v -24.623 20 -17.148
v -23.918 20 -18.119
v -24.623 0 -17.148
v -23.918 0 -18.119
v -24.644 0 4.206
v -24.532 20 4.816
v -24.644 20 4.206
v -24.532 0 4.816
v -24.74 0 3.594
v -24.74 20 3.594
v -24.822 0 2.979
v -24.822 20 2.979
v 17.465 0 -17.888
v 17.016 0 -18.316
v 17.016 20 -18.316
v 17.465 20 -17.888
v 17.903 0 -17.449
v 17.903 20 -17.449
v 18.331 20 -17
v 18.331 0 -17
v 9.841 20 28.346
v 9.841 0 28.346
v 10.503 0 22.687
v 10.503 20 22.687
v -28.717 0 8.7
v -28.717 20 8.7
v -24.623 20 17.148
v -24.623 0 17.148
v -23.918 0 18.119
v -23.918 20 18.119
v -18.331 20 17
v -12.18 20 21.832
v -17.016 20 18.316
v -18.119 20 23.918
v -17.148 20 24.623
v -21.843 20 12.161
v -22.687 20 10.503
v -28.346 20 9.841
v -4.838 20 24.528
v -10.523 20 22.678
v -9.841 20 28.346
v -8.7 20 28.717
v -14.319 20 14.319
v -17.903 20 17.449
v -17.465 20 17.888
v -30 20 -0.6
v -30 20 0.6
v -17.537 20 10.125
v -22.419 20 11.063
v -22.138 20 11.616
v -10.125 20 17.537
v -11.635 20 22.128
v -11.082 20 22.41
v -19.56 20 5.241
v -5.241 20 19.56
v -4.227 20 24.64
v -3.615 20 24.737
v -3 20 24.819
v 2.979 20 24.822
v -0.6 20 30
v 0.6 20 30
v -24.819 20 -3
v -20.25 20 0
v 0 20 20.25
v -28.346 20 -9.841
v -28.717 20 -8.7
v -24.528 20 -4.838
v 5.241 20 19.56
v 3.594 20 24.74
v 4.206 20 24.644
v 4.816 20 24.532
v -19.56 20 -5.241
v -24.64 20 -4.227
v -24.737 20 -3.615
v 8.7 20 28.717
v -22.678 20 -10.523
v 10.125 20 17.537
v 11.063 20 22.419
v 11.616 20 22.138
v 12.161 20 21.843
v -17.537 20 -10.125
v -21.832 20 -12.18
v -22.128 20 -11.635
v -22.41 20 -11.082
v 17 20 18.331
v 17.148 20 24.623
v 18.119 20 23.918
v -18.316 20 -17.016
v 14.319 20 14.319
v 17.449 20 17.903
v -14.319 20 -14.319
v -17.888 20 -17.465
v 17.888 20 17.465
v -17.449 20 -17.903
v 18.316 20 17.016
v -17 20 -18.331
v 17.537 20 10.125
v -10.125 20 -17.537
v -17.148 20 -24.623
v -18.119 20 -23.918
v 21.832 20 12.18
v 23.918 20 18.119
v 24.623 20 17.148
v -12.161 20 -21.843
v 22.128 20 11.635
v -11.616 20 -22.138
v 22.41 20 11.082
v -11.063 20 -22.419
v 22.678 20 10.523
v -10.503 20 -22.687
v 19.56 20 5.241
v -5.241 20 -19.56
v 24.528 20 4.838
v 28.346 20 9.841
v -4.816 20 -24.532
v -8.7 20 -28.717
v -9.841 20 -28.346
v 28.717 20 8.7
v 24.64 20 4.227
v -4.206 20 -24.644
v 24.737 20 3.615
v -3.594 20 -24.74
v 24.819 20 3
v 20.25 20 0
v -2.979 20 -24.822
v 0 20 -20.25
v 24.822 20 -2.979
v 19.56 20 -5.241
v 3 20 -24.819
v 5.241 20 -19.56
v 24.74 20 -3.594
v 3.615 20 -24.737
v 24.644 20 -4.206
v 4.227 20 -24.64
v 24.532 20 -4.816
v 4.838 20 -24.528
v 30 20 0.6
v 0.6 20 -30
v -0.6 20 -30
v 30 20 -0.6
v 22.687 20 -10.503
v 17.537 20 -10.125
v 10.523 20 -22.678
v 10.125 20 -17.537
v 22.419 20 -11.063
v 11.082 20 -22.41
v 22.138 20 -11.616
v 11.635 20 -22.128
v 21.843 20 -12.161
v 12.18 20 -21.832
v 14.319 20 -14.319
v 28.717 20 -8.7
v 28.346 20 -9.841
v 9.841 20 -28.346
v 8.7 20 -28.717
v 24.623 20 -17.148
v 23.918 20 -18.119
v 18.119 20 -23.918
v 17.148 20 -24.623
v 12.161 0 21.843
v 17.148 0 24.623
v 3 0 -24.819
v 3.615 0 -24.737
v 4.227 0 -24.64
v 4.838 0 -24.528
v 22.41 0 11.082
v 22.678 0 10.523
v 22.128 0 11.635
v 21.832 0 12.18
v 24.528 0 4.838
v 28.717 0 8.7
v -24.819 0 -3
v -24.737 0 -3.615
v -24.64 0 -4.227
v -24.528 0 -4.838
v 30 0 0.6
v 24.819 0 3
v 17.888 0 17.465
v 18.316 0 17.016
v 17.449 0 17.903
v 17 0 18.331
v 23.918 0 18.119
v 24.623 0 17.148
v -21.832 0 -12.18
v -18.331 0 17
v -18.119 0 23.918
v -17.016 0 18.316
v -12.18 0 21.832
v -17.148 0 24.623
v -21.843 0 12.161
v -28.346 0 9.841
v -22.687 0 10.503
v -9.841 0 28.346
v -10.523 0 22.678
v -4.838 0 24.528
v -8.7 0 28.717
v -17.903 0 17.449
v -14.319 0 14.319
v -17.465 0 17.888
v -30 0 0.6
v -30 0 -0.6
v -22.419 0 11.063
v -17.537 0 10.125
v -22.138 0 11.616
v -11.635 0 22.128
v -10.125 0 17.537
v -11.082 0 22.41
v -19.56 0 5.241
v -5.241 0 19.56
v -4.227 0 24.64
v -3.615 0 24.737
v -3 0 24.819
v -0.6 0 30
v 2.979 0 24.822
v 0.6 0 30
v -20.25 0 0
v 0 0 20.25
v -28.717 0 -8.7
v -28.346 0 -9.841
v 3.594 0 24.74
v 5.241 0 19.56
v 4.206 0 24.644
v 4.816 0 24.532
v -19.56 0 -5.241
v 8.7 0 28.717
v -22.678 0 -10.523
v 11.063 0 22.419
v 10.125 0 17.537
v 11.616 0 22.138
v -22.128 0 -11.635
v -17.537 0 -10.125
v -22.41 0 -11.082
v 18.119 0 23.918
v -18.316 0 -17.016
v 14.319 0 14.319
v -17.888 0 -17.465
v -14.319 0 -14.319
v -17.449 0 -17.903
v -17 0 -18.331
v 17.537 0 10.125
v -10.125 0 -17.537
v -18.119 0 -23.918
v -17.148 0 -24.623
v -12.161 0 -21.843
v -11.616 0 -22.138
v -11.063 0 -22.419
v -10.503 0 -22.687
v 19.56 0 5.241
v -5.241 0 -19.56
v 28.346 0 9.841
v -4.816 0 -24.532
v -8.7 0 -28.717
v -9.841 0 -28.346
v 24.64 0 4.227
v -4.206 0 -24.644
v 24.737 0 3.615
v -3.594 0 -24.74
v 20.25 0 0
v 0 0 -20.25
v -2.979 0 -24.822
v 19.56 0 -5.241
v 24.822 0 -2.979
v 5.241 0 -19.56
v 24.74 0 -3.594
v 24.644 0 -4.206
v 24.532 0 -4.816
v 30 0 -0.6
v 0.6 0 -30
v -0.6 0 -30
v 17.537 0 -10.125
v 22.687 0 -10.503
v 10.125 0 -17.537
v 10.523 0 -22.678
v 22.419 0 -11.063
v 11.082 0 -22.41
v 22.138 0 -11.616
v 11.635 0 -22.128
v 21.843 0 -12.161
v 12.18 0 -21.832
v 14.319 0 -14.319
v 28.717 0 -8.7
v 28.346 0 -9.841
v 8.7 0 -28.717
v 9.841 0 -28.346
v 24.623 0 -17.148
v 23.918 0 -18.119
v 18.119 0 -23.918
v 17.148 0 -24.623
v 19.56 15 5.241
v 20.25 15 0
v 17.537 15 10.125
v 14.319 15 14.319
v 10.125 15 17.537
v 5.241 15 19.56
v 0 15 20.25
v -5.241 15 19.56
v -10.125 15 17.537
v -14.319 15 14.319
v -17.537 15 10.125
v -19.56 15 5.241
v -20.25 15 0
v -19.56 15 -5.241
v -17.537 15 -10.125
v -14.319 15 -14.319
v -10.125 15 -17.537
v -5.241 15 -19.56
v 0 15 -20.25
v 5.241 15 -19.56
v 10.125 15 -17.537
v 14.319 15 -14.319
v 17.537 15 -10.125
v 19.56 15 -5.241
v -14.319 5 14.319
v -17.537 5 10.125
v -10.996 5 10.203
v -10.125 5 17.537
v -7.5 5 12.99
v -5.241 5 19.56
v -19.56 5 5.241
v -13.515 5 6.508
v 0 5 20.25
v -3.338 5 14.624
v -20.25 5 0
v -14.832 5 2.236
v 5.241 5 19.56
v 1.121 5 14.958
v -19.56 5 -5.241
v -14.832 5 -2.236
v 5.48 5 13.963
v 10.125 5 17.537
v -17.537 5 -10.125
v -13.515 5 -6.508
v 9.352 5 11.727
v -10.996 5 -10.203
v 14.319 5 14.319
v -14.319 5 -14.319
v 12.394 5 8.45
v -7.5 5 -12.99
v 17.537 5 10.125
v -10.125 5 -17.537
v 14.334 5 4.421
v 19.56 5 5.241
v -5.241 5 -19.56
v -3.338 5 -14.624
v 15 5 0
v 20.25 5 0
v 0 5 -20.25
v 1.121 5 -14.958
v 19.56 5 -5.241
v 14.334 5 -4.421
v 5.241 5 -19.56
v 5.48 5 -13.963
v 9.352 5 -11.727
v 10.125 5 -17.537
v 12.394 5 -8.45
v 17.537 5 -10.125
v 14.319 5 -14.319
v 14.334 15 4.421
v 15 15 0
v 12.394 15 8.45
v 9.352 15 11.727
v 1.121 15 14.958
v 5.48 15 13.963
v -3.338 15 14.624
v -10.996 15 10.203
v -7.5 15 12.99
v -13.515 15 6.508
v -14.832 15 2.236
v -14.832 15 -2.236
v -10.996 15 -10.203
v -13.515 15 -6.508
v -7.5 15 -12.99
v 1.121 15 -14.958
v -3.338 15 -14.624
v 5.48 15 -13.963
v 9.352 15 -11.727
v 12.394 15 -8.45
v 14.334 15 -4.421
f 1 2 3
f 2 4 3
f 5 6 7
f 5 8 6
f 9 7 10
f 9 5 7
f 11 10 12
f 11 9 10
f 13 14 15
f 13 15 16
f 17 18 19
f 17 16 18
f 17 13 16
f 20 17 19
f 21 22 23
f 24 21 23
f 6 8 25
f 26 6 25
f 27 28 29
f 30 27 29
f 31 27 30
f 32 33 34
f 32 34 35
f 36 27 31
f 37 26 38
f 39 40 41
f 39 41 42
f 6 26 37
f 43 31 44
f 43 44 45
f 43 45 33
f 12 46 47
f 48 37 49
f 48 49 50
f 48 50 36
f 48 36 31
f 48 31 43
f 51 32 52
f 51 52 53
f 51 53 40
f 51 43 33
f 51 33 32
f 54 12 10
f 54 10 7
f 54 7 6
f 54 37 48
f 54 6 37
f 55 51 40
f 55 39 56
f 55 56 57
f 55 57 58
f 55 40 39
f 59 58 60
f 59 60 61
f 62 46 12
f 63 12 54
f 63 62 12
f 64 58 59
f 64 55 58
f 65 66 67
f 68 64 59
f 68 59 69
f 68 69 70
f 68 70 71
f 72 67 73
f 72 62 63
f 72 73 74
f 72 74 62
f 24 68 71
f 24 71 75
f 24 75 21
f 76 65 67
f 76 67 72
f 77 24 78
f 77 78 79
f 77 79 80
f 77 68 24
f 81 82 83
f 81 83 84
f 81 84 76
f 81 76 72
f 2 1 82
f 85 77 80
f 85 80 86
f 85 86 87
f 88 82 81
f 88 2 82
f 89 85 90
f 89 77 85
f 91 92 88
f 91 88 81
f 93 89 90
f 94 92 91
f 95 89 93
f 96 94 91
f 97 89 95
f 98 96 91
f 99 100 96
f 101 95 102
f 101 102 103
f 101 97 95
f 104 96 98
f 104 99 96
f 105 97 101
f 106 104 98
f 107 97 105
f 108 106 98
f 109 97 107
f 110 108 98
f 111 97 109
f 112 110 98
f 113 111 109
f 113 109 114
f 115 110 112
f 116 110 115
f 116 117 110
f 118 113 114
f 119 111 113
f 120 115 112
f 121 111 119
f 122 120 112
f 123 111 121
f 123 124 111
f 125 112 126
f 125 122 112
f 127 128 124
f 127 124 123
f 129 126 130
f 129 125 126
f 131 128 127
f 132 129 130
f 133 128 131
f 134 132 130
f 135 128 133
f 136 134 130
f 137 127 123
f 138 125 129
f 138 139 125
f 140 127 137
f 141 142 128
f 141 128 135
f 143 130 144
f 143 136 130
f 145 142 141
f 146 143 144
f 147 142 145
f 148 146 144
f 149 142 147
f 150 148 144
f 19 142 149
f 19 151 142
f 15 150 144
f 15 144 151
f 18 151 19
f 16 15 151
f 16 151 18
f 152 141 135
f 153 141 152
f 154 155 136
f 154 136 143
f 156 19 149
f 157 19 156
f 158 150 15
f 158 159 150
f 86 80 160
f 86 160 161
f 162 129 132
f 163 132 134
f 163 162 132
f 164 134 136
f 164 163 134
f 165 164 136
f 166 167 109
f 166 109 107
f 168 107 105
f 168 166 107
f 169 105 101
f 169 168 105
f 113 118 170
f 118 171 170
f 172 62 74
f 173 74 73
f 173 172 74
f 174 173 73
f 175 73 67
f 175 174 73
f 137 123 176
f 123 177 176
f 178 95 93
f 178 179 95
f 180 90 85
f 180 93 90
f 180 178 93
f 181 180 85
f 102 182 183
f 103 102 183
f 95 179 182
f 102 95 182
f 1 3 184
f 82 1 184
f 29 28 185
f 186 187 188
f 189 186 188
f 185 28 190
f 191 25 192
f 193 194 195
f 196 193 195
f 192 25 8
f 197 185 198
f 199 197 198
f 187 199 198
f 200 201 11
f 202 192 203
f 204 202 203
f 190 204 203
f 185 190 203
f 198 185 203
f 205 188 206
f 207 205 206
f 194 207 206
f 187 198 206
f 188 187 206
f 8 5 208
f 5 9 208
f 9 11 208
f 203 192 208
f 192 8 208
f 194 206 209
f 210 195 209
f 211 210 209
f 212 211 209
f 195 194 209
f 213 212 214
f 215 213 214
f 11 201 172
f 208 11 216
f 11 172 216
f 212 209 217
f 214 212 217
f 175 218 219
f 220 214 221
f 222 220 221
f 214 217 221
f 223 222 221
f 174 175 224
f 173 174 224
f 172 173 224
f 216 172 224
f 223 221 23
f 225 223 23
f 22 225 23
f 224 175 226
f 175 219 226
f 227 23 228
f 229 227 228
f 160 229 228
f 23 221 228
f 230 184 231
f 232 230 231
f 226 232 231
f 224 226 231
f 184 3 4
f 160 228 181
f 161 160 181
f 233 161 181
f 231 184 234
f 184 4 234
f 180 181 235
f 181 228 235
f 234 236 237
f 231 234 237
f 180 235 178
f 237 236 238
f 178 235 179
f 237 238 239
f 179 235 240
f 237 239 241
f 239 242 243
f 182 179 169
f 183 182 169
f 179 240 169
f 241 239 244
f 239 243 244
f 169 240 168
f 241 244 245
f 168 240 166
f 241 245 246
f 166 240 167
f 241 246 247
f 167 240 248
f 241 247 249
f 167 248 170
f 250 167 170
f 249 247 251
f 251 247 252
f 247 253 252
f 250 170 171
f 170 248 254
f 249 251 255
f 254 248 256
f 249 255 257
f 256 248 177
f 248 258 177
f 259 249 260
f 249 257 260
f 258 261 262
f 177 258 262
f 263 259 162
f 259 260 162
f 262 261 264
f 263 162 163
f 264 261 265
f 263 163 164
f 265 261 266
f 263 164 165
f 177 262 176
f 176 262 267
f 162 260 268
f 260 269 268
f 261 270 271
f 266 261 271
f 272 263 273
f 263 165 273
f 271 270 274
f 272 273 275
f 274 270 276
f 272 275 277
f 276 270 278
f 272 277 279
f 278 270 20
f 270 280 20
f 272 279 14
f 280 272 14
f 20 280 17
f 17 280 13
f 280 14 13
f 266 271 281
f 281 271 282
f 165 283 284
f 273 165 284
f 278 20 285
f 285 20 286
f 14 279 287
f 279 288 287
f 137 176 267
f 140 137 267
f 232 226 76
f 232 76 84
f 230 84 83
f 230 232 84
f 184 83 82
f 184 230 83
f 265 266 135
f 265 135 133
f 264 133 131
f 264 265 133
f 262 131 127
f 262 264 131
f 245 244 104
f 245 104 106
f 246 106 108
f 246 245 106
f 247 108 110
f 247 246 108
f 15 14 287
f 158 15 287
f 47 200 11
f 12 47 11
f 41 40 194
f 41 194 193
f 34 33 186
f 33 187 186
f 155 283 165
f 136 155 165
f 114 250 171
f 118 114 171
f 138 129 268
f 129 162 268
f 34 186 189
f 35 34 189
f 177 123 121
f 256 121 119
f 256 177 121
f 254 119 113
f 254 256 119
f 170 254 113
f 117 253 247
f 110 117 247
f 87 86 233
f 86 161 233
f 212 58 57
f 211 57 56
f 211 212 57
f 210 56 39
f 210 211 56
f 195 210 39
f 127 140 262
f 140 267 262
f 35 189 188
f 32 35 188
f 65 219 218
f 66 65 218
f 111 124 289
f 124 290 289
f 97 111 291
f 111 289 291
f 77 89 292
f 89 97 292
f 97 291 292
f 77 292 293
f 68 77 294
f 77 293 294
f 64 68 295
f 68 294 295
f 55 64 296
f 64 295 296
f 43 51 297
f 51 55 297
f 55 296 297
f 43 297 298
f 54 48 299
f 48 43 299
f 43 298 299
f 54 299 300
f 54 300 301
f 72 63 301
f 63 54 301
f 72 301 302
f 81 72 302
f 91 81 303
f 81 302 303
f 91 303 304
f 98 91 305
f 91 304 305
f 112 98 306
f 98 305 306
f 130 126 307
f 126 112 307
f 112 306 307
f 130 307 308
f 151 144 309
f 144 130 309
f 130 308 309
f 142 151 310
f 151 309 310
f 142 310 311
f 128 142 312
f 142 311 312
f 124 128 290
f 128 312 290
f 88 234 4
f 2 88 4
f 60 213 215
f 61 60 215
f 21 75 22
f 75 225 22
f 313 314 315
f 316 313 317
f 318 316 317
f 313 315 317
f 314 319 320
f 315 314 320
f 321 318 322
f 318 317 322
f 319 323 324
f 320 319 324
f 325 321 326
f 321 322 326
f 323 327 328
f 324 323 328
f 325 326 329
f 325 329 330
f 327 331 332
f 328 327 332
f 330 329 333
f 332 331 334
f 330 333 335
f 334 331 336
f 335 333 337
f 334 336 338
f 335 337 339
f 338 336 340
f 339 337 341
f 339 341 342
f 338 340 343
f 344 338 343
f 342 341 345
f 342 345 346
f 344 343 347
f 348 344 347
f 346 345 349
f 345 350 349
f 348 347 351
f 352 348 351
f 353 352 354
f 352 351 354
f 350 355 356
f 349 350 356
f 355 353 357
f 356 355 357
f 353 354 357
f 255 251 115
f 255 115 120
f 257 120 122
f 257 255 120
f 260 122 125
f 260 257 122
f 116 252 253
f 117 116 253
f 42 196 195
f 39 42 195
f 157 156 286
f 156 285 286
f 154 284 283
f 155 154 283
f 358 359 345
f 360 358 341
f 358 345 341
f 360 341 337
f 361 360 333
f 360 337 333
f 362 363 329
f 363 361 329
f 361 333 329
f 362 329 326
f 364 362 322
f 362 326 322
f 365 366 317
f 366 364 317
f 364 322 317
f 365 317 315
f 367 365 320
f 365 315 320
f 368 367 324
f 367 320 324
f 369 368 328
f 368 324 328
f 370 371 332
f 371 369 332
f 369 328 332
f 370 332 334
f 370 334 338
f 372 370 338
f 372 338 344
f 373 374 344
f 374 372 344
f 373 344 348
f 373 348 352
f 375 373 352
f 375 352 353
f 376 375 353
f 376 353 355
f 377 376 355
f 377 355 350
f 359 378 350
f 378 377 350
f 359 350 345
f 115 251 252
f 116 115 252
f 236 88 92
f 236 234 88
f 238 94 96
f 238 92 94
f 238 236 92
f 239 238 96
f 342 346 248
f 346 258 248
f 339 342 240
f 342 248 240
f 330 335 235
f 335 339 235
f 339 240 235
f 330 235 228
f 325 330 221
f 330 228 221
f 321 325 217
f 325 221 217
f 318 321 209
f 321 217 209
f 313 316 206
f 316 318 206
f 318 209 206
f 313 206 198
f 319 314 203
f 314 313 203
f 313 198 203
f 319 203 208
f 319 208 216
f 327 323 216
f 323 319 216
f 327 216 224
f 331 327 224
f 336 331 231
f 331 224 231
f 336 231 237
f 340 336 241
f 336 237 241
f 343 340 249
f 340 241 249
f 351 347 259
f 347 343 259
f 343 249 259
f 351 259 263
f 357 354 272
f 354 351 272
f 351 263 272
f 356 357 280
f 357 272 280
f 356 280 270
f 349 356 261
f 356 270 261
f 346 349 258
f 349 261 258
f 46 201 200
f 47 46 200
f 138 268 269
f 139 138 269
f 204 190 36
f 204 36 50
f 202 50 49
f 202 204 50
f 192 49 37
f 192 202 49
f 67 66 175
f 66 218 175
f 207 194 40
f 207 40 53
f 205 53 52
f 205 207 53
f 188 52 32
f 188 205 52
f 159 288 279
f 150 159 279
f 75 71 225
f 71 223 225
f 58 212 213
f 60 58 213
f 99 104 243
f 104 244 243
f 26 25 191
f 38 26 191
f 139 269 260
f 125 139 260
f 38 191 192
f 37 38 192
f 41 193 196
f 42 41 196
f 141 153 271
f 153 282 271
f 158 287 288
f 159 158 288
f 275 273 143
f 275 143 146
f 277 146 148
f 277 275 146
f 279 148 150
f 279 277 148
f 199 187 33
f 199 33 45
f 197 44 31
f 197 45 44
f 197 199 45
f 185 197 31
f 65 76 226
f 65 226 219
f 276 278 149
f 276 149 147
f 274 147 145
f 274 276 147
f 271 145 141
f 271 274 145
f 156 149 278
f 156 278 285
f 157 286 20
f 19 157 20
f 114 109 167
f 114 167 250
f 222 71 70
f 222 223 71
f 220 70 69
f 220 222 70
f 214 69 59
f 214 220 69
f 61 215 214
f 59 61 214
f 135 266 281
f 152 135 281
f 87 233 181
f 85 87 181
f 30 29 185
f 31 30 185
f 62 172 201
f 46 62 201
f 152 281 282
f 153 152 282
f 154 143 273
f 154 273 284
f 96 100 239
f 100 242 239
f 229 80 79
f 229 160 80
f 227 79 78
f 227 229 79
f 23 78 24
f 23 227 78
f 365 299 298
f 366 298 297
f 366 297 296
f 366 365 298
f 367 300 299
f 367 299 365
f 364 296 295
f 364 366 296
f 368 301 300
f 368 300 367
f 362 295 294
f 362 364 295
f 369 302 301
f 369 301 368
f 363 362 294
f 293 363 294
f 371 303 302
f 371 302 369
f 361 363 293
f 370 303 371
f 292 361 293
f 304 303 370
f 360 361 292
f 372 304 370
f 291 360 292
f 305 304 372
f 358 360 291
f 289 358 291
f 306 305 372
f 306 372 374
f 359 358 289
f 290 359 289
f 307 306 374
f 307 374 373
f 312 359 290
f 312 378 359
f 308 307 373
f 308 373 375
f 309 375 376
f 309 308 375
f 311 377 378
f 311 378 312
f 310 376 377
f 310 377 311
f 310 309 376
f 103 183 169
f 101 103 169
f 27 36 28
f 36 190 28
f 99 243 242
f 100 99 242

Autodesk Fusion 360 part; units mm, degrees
sketch "Sketch1" plane through (0, 0, 0) normal (0, 1, 0) x (1, 0, 0)
  circle A0 centre (0, 0) radius 20.25
  circle A1 centre (0, 0) radius 15
  line L0 (-30, 0.6) -> (-30, -0.6)
  line L1 (30, -0.6) -> (30, 0.6)
  line L2 (30, 0.6) -> (24.8219, 2.9786)
  line L3 (24.995, -0.4999) -> (25, -0.5) construction
  line L4 (29.994, -0.5999) -> (30, -0.6) construction
  line L5 (30, 0.6) -> (29.994, 0.5999) construction
  line L6 (25, 0.5) -> (24.995, 0.4999) construction
  line L7 (25, 3) -> (25, 2.8968)
  line L8 (24.8193, -3) -> (30, -0.6)
  line L9 (25, -3) -> (24.8193, -3)
  line L10 (-25, -3) -> (-24.8219, -2.9786) construction
  line L11 (30, 0.6) -> (29.994, 0.6)
  line L12 (24.8193, 3) -> (25, 3)
  line L13 (29.994, -0.6) -> (30, -0.6)
  line L14 (14.8932, 1.7872) -> (20.1058, 2.4127) construction
  line L15 (24.8219, 2.9786) -> (25, 3) construction
  line L16 (28.7171, 8.6999) -> (28.3463, 9.8411)
  line L17 (24.5317, 4.8164) -> (28.7171, 8.6999)
  line L18 (28.3463, 9.8411) -> (22.6866, 10.5032)
  line L19 (24.6232, 17.1481) -> (23.9178, 18.119)
  line L20 (21.8426, 12.1614) -> (24.6232, 17.1481)
  line L21 (23.9178, 18.119) -> (18.3306, 16.9997)
  line L22 (18.119, 23.9178) -> (17.1481, 24.6232)
  line L23 (17.0155, 18.3159) -> (18.119, 23.9178)
  line L24 (17.1481, 24.6232) -> (12.1802, 21.8322)
  line L25 (9.8411, 28.3463) -> (8.6999, 28.7171)
  line L26 (10.5228, 22.6776) -> (9.8411, 28.3463)
  line L27 (8.6999, 28.7171) -> (4.8375, 24.5275)
  line L28 (0.6, 30) -> (-0.6, 30)
  line L29 (3, 24.8193) -> (0.6, 30)
  line L30 (-0.6, 30) -> (-2.9786, 24.8219)
  line L31 (-8.6999, 28.7171) -> (-9.8411, 28.3463)
  line L32 (-4.8164, 24.5317) -> (-8.6999, 28.7171)
  line L33 (-9.8411, 28.3463) -> (-10.5032, 22.6866)
  line L34 (-17.1481, 24.6232) -> (-18.119, 23.9178)
  line L35 (-12.1614, 21.8426) -> (-17.1481, 24.6232)
  line L36 (-18.119, 23.9178) -> (-16.9997, 18.3306)
  line L37 (-23.9178, 18.119) -> (-24.6232, 17.1481)
  line L38 (-18.3159, 17.0155) -> (-23.9178, 18.119)
  line L39 (-24.6232, 17.1481) -> (-21.8322, 12.1802)
  line L40 (-28.3463, 9.8411) -> (-28.7171, 8.6999)
  line L41 (-22.6776, 10.5228) -> (-28.3463, 9.8411)
  line L42 (-28.7171, 8.6999) -> (-24.5275, 4.8375)
  line L43 (-30, 0.6) -> (-30, -0.6)
  line L44 (-24.8193, 3) -> (-30, 0.6)
  line L45 (-30, -0.6) -> (-24.8219, -2.9786)
  line L46 (-28.7171, -8.6999) -> (-28.3463, -9.8411)
  line L47 (-24.5317, -4.8164) -> (-28.7171, -8.6999)
  line L48 (-28.3463, -9.8411) -> (-22.6866, -10.5032)
  line L49 (-24.6232, -17.1481) -> (-23.9178, -18.119)
  line L50 (-21.8426, -12.1614) -> (-24.6232, -17.1481)
  line L51 (-23.9178, -18.119) -> (-18.3306, -16.9997)
  line L52 (-18.119, -23.9178) -> (-17.1481, -24.6232)
  line L53 (-17.0155, -18.3159) -> (-18.119, -23.9178)
  line L54 (-17.1481, -24.6232) -> (-12.1802, -21.8322)
  line L55 (-9.8411, -28.3463) -> (-8.6999, -28.7171)
  line L56 (-10.5228, -22.6776) -> (-9.8411, -28.3463)
  line L57 (-8.6999, -28.7171) -> (-4.8375, -24.5275)
  line L58 (-0.6, -30) -> (0.6, -30)
  line L59 (-3, -24.8193) -> (-0.6, -30)
  line L60 (0.6, -30) -> (2.9786, -24.8219)
  line L61 (8.6999, -28.7171) -> (9.8411, -28.3463)
  line L62 (4.8164, -24.5317) -> (8.6999, -28.7171)
  line L63 (9.8411, -28.3463) -> (10.5032, -22.6866)
  line L64 (17.1481, -24.6232) -> (18.119, -23.9178)
  line L65 (12.1614, -21.8426) -> (17.1481, -24.6232)
  line L66 (18.119, -23.9178) -> (16.9997, -18.3306)
  line L67 (23.9178, -18.119) -> (24.6232, -17.1481)
  line L68 (18.3159, -17.0155) -> (23.9178, -18.119)
  line L69 (24.6232, -17.1481) -> (21.8322, -12.1802)
  line L70 (28.3463, -9.8411) -> (28.7171, -8.6999)
  line L71 (22.6776, -10.5228) -> (28.3463, -9.8411)
  line L72 (28.7171, -8.6999) -> (24.5275, -4.8375)
  arc A2 (12.1802, 21.8322) -> (10.5228, 22.6776) centre (0, 0) ccw
  arc A3 (4.8375, 24.5275) -> (3, 24.8193) centre (0, 0) ccw
  arc A4 (-2.9786, 24.8219) -> (-4.8164, 24.5317) centre (0, 0) ccw
  arc A5 (-10.5032, 22.6866) -> (-12.1614, 21.8426) centre (0, 0) ccw
  arc A6 (-16.9997, 18.3306) -> (-18.3159, 17.0155) centre (0, 0) ccw
  arc A7 (-21.8322, 12.1802) -> (-22.6776, 10.5228) centre (0, 0) ccw
  line L73 (-24.8193, -3) -> (-25, -3)
  line L74 (-24.8219, 2.9786) -> (-25, 3) construction
  line L75 (-25, 3) -> (-24.8193, 3)
  line L76 (-24.9928, 0.6) -> (-25, 0.6)
  line L77 (-25, 0.5) -> (-24.995, 0.4999) construction
  line L78 (-25, -0.6) -> (-24.9928, -0.6)
  line L79 (-24.995, -0.4999) -> (-25, -0.5) construction
  arc A8 (-24.5275, 4.8375) -> (-24.8219, 2.9786) centre (0, 0) ccw
  line L80 (-25, 2.9163) -> (-25, 3)
  line L81 (-25, -3) -> (-25, -2.8968)
  arc A9 (-24.8219, -2.9786) -> (-24.5317, -4.8164) centre (0, 0) ccw
  arc A10 (-22.6866, -10.5032) -> (-21.8426, -12.1614) centre (0, 0) ccw
  arc A11 (-18.3306, -16.9997) -> (-17.0155, -18.3159) centre (0, 0) ccw
  arc A12 (-12.1802, -21.8322) -> (-10.5228, -22.6776) centre (0, 0) ccw
  arc A13 (-4.8375, -24.5275) -> (-3, -24.8193) centre (0, 0) ccw
  arc A14 (2.9786, -24.8219) -> (4.8164, -24.5317) centre (0, 0) ccw
  arc A15 (10.5032, -22.6866) -> (12.1614, -21.8426) centre (0, 0) ccw
  arc A16 (24.5275, -4.8375) -> (24.8193, -3) centre (0, 0) ccw
  arc A17 (24.8219, 2.9786) -> (24.5317, 4.8164) centre (0, 0) ccw
  arc A18 (22.6866, 10.5032) -> (21.8426, 12.1614) centre (0, 0) ccw
  arc A19 (18.3306, 16.9997) -> (17.0155, 18.3159) centre (0, 0) ccw
  arc A20 (16.9997, -18.3306) -> (18.3159, -17.0155) centre (0, 0) ccw
  arc A21 (21.8322, -12.1802) -> (22.6776, -10.5228) centre (0, 0) ccw
  dimension "d2" = 40.5
  dimension "d3" = 30
  dimension "d4" = 50
  dimension "d5" = 50
  dimension "d6" = 6
  dimension "d7" = 60
  dimension "d8" = 1.2
  dimension "d10" = 360
extrude "Extrude1" add sketch "Sketch1" along normal blind 20 contours L0 L1 L2 L8 L16 L17 L18 L19 L20 L21 L22 L23 L24 L25 L26 L27 L28 L29 L30 L31 L32 L33 L34 L35 L36 L37 L38 L39 L40 L41 L42 L43 L44 L45 L46 L47 L48 L49 L50 L51 L52 L53 L54 L55 L56 L57 L58 L59 L60 L61 L62 L63 L64 L65 L66 L67 L68 L69 L70 L71 L72 A2 A3 A4 A5 A6 A7 A8 A9 A10 A11 A12 A13 A14 A15 A16 A17 A18 A19 A20 A21
extrude "Extrude2" add sketch "Sketch1" along normal blind 10 from surface at 5 contours A0
